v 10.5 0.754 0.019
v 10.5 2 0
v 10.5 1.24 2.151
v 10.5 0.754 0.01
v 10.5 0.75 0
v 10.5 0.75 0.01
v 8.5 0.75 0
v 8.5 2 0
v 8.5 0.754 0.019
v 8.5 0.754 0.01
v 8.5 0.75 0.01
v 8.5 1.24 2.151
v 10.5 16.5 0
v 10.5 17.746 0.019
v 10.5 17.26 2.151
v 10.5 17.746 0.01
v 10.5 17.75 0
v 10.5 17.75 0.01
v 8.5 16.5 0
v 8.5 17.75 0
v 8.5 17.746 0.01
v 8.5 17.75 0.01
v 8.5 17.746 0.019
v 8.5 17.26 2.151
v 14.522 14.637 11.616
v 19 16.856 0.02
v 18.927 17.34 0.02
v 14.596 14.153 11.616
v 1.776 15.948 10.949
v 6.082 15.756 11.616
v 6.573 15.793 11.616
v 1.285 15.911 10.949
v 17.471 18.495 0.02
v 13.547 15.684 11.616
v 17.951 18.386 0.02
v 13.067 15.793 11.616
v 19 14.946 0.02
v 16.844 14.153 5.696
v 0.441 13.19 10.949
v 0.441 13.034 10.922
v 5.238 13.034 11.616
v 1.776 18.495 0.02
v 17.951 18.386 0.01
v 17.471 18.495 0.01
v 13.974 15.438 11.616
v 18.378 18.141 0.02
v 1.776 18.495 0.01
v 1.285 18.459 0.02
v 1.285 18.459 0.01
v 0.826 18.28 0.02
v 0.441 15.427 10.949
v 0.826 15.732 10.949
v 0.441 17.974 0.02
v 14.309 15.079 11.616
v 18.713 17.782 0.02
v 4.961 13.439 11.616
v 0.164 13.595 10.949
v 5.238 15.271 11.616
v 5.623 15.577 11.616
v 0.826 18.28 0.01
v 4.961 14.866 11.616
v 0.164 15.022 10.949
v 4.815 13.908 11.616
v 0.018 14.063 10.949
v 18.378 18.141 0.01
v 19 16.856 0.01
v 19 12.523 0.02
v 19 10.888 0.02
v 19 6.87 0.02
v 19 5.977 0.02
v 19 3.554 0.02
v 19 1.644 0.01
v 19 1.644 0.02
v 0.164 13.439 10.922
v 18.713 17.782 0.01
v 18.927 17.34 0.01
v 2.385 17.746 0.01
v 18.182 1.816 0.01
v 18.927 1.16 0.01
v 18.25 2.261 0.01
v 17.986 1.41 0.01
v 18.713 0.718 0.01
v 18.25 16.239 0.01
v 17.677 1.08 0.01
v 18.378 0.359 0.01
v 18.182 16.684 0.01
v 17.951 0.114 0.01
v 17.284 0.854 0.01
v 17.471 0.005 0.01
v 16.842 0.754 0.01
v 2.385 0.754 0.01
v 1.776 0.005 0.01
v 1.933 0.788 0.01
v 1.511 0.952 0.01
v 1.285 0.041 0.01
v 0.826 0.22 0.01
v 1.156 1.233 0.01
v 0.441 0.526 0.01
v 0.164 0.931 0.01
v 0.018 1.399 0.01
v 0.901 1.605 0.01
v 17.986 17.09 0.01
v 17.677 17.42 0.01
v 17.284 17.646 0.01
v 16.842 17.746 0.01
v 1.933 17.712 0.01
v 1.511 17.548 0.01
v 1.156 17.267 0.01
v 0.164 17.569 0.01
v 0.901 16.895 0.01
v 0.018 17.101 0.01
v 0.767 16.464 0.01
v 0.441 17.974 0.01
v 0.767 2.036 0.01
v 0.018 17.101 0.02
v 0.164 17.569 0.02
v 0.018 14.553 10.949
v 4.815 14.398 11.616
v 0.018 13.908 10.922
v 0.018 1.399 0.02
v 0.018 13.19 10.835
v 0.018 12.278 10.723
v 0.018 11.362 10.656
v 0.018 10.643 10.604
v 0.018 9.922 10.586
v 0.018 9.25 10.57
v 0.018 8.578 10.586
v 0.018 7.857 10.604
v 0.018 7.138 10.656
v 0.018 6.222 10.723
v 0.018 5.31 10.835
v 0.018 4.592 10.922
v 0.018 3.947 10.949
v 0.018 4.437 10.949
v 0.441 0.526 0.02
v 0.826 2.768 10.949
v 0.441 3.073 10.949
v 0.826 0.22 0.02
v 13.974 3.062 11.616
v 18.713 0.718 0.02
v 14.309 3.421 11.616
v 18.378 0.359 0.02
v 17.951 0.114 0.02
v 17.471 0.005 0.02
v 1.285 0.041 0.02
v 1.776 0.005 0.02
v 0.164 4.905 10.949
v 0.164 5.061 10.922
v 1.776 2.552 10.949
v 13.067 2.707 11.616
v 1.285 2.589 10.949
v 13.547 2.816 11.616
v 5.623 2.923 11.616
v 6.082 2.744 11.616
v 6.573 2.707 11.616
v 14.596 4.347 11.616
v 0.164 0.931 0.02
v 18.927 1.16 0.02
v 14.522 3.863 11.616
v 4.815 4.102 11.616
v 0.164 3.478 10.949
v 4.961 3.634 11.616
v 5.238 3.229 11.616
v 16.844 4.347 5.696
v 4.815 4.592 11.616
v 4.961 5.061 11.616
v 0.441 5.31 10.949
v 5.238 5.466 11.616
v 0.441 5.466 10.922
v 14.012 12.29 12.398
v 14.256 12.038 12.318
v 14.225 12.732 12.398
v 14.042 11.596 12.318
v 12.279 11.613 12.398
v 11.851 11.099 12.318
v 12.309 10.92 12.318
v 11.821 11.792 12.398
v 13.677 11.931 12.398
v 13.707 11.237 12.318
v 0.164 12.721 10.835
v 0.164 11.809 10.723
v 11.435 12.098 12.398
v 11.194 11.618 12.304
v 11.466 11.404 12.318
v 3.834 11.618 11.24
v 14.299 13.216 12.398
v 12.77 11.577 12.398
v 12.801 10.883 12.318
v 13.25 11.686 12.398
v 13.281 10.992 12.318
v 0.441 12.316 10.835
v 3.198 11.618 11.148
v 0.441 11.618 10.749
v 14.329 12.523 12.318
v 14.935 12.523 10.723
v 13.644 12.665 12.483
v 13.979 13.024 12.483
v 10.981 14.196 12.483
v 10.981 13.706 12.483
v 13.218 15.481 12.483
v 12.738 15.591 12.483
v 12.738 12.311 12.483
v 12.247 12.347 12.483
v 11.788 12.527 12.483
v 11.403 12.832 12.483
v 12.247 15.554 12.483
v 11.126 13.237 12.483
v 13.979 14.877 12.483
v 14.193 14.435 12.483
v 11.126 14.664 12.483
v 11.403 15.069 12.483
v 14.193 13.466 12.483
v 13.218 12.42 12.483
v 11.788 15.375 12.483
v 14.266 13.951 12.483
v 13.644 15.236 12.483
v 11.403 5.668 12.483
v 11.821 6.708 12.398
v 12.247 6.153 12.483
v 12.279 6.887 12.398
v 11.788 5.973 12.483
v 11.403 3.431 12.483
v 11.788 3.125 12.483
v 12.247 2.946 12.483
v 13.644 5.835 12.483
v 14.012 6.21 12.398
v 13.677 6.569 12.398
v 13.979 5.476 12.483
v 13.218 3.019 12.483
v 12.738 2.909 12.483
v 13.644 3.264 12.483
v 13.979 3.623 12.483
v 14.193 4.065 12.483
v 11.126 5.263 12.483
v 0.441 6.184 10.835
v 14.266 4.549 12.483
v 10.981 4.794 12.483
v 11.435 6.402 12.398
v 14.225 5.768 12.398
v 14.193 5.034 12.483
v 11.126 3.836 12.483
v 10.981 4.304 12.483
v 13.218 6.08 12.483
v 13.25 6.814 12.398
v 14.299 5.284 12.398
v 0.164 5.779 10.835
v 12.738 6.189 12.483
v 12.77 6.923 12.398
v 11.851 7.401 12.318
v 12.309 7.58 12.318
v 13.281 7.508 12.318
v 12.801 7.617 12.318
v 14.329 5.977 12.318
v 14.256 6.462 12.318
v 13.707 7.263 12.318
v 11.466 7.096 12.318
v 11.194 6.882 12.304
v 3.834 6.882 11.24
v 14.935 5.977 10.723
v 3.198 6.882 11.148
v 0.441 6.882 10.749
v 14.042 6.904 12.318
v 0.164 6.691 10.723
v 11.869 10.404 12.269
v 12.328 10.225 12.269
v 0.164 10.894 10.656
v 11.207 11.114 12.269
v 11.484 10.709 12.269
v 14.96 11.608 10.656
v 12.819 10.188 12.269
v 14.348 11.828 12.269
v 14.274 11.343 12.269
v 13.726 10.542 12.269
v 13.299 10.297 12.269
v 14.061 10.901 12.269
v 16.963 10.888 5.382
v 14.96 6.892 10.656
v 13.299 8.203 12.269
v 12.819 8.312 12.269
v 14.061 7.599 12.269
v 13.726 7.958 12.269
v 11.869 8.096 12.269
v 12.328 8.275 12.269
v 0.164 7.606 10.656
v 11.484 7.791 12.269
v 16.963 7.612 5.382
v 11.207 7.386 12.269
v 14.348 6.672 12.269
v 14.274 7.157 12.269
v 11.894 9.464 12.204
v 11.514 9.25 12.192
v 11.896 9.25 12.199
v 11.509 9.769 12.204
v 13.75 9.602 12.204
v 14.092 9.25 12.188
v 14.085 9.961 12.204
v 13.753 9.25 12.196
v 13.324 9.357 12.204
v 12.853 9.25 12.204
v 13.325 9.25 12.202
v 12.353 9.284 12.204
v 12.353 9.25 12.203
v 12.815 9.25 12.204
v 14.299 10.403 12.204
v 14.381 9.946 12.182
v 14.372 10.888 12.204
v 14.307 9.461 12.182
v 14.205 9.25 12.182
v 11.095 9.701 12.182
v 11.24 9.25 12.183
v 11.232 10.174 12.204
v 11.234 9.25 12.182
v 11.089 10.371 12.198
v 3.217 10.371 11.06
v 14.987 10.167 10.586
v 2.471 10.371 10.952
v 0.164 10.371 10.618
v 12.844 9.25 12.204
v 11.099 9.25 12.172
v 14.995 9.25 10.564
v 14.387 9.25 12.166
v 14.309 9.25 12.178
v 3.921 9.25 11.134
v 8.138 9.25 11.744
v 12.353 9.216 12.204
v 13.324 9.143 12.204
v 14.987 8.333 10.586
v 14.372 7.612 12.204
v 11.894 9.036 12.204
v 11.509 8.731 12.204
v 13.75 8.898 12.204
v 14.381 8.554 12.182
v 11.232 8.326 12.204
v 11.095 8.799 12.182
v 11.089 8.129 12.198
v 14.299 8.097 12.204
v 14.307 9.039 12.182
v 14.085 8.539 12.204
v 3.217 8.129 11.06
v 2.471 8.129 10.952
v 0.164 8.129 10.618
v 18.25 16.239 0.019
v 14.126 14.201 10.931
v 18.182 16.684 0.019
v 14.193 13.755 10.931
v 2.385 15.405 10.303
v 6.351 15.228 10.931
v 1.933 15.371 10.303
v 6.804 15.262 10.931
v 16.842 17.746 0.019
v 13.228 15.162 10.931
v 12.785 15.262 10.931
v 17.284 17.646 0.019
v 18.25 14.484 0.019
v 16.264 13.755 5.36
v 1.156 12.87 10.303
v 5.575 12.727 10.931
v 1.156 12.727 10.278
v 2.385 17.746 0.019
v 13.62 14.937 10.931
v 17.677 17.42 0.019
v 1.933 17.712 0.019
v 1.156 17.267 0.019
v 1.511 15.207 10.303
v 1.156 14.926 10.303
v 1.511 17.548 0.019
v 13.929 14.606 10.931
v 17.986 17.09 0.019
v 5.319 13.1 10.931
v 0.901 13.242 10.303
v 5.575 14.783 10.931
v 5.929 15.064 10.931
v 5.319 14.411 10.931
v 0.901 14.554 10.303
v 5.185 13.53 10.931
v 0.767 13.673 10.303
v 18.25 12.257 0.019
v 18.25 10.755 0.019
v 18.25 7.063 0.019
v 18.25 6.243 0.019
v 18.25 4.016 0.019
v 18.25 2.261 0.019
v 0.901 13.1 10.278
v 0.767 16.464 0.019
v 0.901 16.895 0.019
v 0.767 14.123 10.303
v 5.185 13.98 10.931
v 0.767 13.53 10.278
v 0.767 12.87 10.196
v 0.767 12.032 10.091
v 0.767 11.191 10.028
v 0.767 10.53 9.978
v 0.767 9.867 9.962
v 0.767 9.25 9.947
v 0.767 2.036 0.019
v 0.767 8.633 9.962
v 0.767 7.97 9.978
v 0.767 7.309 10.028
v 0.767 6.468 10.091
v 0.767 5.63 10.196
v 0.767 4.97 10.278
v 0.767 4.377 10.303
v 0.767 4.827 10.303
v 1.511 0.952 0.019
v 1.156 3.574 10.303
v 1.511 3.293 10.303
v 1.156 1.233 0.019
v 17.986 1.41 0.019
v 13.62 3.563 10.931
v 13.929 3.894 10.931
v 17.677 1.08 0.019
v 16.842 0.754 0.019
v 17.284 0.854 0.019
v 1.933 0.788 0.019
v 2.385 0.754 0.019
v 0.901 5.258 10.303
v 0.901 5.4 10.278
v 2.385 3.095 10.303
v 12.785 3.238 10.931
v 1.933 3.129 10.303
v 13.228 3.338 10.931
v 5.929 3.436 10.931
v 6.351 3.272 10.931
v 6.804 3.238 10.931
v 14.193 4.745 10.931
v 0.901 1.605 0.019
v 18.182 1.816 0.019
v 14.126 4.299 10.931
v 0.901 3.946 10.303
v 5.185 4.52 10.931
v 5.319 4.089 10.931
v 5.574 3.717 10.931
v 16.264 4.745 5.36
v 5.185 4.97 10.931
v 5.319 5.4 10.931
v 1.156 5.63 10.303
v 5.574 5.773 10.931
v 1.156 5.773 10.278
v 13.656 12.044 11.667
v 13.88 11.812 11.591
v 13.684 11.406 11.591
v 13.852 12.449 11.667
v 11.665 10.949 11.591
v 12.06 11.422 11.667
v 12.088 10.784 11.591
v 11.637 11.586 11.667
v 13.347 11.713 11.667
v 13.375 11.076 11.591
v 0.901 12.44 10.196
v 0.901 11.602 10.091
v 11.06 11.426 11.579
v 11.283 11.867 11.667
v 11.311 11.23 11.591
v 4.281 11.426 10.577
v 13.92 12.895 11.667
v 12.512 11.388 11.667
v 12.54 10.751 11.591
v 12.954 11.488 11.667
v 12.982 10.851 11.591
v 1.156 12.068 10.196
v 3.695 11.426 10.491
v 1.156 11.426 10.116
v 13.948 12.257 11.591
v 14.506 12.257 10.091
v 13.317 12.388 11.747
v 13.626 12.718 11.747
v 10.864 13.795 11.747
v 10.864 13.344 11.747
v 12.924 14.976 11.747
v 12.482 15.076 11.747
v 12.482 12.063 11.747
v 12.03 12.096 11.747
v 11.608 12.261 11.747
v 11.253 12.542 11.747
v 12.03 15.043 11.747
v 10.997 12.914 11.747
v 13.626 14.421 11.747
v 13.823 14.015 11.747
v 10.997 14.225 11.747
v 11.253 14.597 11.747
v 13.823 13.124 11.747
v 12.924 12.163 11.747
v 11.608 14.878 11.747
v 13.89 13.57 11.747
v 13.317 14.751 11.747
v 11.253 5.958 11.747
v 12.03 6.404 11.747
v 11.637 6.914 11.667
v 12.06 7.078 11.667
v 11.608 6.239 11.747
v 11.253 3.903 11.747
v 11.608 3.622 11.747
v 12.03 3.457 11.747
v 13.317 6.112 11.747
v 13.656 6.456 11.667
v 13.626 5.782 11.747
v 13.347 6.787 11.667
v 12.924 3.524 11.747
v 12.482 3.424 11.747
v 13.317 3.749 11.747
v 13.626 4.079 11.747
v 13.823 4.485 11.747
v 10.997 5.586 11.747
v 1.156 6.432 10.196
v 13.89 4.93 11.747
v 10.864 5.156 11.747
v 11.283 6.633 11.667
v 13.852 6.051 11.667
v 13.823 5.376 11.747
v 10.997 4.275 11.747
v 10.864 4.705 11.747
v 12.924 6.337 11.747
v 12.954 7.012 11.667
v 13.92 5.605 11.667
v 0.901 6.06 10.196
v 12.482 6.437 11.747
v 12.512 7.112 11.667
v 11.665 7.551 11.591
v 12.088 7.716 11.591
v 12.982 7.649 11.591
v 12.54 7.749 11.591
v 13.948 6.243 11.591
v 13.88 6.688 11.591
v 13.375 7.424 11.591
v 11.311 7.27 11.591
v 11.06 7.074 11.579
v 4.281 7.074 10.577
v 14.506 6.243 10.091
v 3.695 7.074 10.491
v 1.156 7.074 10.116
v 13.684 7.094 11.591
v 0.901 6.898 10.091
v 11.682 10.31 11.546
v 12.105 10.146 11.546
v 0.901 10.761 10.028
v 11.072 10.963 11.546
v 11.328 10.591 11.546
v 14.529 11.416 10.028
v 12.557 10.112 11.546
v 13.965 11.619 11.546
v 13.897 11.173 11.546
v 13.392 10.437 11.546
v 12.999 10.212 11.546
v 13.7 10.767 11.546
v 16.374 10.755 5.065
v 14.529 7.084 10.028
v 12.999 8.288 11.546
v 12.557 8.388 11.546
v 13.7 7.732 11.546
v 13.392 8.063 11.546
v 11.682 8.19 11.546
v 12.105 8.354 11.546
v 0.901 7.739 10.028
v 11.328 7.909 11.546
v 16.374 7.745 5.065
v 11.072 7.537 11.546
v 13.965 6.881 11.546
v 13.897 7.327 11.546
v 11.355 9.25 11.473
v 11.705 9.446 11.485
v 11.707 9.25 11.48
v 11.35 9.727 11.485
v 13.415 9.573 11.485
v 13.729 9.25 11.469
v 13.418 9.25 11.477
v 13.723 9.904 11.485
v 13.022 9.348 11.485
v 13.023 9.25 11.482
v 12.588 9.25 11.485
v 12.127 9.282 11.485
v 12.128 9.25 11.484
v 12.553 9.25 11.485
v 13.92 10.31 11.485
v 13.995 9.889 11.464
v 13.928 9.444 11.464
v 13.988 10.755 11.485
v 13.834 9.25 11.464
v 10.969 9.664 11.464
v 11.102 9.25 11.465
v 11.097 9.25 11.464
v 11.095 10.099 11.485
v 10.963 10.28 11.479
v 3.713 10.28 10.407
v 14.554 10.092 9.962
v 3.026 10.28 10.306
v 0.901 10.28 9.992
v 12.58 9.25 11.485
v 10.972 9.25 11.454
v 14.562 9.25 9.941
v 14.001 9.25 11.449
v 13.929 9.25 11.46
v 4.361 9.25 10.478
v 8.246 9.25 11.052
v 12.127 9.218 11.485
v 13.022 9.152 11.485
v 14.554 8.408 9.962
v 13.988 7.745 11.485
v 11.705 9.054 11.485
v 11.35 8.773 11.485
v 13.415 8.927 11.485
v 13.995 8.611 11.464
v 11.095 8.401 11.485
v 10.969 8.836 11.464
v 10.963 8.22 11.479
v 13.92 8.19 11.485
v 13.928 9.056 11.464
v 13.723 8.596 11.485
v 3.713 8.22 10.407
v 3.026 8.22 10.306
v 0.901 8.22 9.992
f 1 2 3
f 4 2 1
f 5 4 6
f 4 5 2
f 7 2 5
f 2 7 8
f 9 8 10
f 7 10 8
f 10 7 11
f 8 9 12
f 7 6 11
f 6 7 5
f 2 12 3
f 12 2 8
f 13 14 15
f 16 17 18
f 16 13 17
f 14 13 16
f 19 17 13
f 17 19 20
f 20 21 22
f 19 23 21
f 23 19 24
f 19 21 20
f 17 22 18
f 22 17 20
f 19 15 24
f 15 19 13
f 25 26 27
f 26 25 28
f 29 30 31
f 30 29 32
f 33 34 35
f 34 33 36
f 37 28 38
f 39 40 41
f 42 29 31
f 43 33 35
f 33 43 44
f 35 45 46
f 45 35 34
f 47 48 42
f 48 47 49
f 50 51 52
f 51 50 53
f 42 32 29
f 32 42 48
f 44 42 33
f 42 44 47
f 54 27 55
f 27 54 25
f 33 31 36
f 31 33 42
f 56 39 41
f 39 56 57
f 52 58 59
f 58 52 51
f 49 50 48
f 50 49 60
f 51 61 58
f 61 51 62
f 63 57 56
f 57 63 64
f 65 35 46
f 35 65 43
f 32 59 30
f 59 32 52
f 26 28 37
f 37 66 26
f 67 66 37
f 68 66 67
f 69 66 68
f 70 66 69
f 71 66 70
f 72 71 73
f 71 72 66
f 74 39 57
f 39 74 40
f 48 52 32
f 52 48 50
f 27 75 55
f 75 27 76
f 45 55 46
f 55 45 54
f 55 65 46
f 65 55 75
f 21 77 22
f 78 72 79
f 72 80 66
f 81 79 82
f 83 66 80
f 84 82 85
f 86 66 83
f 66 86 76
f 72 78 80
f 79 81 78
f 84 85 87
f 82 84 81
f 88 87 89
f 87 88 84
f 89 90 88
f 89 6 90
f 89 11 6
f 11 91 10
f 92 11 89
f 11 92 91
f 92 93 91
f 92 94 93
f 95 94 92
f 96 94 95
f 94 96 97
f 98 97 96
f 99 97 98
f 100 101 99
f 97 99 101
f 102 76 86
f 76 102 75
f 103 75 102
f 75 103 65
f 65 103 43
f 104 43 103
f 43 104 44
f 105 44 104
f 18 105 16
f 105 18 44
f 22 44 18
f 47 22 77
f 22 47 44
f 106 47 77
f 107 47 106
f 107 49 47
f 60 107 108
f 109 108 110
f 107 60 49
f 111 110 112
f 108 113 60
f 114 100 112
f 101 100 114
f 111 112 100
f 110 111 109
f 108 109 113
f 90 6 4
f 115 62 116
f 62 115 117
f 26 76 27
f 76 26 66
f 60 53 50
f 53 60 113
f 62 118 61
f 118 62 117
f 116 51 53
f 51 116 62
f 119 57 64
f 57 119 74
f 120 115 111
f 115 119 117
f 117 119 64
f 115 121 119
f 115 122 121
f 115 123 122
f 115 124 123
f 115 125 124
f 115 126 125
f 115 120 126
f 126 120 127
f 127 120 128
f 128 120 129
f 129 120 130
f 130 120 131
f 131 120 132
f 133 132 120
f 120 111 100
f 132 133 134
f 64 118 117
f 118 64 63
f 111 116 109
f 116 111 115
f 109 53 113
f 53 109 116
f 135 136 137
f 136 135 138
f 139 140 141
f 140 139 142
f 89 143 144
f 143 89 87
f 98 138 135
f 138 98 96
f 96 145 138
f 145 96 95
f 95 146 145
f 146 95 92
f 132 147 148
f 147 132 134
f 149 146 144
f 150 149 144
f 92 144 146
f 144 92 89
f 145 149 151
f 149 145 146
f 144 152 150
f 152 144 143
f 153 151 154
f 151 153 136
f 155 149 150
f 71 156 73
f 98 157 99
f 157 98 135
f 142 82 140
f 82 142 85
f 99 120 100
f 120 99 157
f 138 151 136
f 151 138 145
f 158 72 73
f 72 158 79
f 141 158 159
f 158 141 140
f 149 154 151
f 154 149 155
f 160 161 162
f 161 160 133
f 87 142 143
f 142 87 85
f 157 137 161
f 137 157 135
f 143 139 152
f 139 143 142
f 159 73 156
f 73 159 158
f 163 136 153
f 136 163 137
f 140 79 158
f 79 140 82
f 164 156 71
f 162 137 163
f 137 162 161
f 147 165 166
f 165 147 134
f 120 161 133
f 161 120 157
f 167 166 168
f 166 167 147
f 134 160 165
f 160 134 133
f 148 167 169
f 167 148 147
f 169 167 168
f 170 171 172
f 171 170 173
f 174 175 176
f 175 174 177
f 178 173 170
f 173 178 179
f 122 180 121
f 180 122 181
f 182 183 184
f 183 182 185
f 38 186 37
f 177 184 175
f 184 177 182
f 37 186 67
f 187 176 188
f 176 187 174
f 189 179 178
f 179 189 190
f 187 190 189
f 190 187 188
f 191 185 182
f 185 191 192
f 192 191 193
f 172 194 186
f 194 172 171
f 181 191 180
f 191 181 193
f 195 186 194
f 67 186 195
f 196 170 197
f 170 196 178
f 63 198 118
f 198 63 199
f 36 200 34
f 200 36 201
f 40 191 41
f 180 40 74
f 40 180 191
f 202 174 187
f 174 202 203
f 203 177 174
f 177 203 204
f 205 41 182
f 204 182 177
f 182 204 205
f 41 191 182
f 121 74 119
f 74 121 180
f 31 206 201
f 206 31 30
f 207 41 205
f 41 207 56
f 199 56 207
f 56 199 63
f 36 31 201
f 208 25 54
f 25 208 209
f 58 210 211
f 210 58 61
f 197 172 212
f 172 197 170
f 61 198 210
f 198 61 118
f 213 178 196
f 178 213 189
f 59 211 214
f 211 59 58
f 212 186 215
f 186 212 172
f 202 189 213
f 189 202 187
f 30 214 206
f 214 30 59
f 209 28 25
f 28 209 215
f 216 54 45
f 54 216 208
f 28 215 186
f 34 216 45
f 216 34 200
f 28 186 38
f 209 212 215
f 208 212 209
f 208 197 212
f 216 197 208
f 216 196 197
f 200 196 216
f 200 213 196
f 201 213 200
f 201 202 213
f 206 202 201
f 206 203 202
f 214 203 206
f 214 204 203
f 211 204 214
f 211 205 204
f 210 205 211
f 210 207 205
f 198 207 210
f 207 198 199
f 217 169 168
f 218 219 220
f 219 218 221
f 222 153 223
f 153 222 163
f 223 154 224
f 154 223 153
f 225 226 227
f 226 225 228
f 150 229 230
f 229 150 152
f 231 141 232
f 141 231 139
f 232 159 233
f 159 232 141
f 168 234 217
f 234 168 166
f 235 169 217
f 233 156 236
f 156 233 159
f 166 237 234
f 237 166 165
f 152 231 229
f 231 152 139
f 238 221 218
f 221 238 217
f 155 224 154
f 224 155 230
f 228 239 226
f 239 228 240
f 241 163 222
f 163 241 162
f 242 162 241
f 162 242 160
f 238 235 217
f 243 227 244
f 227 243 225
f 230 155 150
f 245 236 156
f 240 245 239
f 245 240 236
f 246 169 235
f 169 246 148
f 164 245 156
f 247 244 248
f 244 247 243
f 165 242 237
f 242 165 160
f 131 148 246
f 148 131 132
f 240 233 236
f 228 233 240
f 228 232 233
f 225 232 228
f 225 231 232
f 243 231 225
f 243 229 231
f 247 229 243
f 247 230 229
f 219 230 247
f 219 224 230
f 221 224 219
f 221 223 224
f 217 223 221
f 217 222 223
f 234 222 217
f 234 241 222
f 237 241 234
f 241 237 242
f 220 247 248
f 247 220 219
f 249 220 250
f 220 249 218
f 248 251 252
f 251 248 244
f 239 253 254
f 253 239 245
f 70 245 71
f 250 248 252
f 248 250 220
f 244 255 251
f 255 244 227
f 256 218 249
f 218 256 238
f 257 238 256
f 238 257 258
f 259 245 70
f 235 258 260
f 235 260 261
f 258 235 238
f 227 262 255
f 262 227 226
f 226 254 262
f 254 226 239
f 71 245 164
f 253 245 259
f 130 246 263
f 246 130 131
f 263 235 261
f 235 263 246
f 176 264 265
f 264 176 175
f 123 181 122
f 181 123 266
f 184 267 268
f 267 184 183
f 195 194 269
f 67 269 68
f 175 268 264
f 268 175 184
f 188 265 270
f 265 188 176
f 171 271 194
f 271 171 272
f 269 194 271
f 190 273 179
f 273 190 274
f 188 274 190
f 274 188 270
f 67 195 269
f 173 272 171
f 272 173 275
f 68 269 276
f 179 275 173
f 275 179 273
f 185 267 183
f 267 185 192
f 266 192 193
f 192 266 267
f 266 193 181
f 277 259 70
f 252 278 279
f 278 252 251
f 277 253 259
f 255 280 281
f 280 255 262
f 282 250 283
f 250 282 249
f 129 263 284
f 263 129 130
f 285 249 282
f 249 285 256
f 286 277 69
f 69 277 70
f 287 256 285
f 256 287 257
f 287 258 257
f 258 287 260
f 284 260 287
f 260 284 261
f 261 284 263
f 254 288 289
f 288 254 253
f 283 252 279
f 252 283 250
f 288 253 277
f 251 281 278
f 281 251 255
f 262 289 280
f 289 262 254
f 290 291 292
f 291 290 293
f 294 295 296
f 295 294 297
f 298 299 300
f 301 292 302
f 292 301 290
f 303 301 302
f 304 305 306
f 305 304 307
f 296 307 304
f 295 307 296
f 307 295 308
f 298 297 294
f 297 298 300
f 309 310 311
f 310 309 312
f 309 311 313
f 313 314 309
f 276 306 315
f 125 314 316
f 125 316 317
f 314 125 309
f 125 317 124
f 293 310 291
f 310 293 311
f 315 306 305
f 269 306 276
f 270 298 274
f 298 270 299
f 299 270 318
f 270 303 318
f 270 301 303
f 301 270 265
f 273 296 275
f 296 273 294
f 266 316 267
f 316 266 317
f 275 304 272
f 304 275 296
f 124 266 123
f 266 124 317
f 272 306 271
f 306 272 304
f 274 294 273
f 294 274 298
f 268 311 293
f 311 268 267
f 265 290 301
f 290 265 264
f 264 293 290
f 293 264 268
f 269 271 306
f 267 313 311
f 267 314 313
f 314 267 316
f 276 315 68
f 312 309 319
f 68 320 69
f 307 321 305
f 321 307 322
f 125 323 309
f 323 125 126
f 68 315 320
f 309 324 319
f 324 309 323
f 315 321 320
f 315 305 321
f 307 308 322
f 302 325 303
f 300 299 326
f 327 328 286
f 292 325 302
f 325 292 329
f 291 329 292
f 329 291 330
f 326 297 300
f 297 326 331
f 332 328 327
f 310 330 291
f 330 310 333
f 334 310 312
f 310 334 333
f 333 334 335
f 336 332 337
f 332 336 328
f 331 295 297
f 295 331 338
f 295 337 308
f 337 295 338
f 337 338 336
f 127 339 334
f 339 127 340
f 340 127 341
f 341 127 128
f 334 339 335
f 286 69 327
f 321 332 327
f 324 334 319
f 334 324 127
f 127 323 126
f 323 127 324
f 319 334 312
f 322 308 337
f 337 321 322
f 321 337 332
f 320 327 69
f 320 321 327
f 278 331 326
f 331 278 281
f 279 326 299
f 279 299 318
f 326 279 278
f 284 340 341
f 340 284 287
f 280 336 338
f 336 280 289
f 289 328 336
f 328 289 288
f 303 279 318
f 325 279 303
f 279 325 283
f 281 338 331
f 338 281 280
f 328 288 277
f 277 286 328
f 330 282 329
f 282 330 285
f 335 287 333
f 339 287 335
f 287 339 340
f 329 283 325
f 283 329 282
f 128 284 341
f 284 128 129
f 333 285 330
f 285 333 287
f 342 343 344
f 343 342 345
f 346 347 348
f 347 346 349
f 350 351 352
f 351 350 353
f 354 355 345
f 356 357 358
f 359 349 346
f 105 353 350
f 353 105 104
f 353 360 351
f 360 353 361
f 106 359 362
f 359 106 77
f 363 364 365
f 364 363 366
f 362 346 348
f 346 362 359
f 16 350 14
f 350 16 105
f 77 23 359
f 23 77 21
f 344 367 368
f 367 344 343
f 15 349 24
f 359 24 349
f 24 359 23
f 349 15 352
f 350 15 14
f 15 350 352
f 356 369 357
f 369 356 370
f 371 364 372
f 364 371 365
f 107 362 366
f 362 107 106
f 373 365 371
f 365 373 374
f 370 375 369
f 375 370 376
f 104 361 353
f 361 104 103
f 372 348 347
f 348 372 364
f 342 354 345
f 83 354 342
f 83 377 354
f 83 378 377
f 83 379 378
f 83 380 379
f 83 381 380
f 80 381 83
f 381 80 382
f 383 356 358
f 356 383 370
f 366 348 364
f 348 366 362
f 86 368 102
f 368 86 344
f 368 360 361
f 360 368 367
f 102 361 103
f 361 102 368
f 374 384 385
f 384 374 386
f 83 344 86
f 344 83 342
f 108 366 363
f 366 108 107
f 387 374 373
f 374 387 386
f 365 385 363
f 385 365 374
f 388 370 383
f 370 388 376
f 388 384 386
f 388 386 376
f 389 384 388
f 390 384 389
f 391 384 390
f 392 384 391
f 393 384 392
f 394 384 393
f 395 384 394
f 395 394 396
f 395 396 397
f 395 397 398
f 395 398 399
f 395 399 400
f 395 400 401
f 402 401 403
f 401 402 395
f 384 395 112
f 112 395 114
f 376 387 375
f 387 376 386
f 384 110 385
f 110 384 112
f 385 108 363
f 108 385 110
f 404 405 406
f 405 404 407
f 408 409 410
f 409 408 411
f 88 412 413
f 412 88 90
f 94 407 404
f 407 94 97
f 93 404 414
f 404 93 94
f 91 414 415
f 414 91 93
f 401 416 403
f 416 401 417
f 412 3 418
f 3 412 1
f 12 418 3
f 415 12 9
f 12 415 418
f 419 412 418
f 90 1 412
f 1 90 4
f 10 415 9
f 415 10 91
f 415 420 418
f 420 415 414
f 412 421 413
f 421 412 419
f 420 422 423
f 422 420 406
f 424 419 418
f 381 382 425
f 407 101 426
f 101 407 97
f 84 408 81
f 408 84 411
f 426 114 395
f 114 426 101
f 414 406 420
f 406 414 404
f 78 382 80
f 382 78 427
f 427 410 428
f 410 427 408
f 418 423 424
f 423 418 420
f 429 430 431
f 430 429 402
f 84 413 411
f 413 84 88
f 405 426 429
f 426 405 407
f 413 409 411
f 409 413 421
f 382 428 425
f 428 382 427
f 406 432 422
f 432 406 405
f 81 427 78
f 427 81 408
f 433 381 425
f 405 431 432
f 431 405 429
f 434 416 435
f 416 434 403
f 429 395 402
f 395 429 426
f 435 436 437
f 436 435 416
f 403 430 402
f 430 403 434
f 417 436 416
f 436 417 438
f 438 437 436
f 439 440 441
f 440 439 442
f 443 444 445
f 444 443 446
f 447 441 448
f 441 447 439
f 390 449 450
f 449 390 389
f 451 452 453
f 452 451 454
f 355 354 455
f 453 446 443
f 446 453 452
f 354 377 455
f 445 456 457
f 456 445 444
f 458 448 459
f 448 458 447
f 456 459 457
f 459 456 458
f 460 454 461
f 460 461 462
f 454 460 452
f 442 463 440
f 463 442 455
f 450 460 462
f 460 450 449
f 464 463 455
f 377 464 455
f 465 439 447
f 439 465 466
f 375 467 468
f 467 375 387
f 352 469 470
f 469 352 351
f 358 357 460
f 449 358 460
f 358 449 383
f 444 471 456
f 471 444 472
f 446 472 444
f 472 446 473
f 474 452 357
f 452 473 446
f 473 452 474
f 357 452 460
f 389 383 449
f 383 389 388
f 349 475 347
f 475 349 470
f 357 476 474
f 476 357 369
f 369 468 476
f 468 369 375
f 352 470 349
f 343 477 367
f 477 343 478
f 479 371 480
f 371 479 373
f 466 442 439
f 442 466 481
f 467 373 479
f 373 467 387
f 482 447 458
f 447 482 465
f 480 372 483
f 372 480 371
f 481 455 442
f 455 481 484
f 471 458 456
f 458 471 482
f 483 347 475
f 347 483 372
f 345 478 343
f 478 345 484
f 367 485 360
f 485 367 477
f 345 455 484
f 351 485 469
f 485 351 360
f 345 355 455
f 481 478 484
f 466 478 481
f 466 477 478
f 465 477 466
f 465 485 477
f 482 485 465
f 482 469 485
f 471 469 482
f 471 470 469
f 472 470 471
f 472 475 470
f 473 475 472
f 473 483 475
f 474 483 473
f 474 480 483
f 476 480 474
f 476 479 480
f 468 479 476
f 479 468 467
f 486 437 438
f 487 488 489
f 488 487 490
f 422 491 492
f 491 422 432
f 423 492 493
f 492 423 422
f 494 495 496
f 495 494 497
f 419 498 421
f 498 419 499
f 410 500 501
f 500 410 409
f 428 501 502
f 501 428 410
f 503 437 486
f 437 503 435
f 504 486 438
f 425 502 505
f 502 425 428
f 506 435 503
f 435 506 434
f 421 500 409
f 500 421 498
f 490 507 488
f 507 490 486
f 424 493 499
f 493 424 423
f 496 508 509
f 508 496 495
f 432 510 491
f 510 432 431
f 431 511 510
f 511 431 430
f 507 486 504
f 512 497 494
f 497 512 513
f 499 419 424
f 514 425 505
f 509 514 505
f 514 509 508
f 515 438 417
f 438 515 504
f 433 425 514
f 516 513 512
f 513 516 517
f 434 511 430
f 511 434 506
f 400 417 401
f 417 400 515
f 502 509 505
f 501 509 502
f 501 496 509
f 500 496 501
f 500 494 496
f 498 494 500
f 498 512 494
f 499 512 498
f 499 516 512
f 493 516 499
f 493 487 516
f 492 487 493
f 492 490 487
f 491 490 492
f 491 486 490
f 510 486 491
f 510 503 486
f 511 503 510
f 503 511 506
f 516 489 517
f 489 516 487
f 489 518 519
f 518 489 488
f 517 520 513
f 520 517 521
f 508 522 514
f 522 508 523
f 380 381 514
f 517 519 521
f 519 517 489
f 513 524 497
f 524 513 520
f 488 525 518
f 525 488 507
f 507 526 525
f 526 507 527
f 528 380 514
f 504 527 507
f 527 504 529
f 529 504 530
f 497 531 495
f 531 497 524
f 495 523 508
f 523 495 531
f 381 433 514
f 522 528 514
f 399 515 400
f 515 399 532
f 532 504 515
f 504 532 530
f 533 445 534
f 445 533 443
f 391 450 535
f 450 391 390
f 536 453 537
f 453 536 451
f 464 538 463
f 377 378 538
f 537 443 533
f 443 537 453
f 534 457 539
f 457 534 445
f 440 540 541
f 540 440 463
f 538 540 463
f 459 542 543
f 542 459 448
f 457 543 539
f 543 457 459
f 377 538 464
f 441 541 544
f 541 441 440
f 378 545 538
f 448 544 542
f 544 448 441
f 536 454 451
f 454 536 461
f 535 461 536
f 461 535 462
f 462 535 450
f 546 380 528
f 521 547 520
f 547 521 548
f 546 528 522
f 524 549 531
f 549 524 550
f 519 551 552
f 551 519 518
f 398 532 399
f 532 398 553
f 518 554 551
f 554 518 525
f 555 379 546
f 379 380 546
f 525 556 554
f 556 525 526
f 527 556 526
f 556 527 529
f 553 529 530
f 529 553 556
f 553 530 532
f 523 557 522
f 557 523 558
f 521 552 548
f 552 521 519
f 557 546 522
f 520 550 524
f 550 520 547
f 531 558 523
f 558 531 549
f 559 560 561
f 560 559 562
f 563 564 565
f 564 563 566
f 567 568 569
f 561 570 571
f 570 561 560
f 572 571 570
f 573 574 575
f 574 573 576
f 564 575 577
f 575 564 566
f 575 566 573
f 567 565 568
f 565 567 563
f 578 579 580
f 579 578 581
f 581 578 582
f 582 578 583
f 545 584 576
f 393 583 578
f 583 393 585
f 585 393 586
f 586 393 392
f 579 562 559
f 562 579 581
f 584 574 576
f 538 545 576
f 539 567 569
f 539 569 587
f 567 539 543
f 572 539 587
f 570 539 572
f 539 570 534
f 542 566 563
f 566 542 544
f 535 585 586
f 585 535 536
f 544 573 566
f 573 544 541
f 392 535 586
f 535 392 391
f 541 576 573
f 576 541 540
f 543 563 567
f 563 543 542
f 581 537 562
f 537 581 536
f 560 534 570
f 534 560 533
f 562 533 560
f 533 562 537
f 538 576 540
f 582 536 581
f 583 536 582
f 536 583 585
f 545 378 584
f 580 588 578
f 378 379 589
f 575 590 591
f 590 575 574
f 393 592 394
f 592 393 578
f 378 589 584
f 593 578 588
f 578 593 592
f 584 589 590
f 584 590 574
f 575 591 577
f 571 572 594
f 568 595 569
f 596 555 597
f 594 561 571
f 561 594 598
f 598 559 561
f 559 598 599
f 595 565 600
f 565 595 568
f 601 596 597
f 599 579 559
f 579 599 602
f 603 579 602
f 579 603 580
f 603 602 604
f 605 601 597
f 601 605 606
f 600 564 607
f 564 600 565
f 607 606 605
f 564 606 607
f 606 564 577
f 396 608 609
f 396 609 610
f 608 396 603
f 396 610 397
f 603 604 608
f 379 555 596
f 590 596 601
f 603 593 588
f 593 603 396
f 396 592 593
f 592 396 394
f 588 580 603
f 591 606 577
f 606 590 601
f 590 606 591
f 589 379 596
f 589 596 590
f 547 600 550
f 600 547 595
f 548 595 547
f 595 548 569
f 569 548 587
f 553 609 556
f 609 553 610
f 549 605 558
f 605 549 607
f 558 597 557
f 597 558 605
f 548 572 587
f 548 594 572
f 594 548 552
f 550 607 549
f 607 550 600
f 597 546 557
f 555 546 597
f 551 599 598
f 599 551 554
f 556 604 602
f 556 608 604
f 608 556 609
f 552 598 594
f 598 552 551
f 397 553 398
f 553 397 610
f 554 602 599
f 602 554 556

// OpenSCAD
//measures are in millimeters
AY=18.5;
AX=19.0;
BY=12.5;
BLX=14.5;
EZ=11.0;
FLZ=14.0;
H=12.72;
CYL_OFF_Z=50;
CYL_DEPTH=0.1;
CLIP_X=2;
CLIP_Y=1.25;
CLIP_H=3*CLIP_Y;
CORNER_RADIUS=2;
WallThickness=0.75;

alpha=asin((H-EZ)/BLX);
beta=asin(H/FLZ);
gamma=90-asin((0.5*(AY-BY))/EZ);

module keycap(){
	scale([AX/(AX+2*CORNER_RADIUS),AY/(AY+2*CORNER_RADIUS),1])
	translate([CORNER_RADIUS,CORNER_RADIUS,0.01])
	minkowski(){
		difference(){
			cube([AX,AY,H]);
			rotate(a=gamma,v=[1,0,0]) cube([100,100,100]);
			translate([0,AY,0]) rotate(a=90-gamma,v=[1,0,0]) cube([100,100,100]);
			translate([0,0,EZ]) rotate(a=-alpha,v=[0,1,0]) translate([-50,0,0]) cube([100,100,100]);
			translate([0,AY/2,EZ+CYL_OFF_Z]) rotate(a=90-alpha,v=[0,1,0]) cylinder(h=100,center=true,r=CYL_OFF_Z+CYL_DEPTH,$fa=1);
			translate([AX,0,0]) rotate(a=beta-90,v=[0,1,0]) cube([100,100,100]);
		}
		cylinder(h=0.01,r=CORNER_RADIUS,$fs=0.6);
	}
}

module clip(){
	difference(){
		cube([CLIP_X,CLIP_Y,CLIP_H]);
		translate([-1,CLIP_Y,0]) rotate(a=asin(CLIP_Y/CLIP_H),v=[1,0,0]) cube([100,100,100]);
        rotate(a=gamma, v=[1, 0, 0]) translate([-1, 0, WallThickness]) cube([100, 100, 100]);
    }
}

translate([(AX-CLIP_X)/2,WallThickness,0]) clip();
translate([0,AY,0]) mirror([0,1,0]) translate([(AX-CLIP_X)/2,WallThickness,0]) clip();

difference(){
    keycap();
    translate([WallThickness, WallThickness, 0]) scale(v=[1-2*WallThickness/AX, 1-2*WallThickness/AY, 1-WallThickness/H]) keycap();
}
